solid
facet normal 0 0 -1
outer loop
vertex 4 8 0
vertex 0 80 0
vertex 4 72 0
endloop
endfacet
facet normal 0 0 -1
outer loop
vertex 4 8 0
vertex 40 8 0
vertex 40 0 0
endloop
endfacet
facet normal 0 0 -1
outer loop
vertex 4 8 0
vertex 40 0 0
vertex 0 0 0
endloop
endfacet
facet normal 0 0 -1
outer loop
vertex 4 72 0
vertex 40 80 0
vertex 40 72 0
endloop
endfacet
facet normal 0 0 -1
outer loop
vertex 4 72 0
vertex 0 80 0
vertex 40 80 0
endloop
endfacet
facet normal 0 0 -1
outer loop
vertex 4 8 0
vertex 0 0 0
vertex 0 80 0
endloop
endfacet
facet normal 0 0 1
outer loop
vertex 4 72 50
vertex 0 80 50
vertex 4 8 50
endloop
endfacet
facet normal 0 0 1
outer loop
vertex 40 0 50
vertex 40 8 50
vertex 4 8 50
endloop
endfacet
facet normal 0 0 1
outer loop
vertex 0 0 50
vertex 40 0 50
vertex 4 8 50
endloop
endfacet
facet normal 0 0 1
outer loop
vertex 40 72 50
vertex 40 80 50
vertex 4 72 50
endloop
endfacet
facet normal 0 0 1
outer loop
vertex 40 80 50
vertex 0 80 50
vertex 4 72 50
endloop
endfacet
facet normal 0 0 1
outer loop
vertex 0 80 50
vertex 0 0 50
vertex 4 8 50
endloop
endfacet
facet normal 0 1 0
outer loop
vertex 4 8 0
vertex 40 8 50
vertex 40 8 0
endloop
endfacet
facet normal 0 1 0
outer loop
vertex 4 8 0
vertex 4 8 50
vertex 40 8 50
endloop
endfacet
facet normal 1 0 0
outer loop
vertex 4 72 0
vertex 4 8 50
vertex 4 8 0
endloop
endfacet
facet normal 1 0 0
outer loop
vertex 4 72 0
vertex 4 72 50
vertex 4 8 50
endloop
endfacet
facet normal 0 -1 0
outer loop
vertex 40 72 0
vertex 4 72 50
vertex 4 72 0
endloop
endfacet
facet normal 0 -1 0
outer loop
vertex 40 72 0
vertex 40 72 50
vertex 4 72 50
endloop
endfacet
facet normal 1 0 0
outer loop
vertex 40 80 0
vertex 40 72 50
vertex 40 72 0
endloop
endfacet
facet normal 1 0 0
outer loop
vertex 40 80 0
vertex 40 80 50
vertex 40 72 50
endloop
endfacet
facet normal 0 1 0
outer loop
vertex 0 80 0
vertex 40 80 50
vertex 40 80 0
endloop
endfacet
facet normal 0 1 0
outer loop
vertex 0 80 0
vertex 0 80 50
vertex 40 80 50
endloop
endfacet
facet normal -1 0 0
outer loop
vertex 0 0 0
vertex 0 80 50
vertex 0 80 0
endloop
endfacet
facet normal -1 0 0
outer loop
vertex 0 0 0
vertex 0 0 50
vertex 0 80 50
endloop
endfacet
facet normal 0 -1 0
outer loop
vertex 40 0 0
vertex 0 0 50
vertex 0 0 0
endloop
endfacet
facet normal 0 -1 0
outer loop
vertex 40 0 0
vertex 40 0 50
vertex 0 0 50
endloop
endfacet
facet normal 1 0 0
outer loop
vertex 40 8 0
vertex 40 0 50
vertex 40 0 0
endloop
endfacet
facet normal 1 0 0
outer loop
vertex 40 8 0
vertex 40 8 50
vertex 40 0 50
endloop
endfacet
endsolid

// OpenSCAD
$fn = 32;

// ----------------------------------------------------------------------
// Structural section: channel 40 x 80 mm
// ----------------------------------------------------------------------

// --- parameters (mm) ---
sec_w = 40;               // channel width, X
sec_h = 80;               // channel height, Y
flange_t = 8;             // flange thickness
web_t = 4;                // web thickness
plate_t = 50;             // cut length, Z (extrusion height)

profile = [[0, 0], [40, 0], [40, 8], [4, 8], [4, 72], [40, 72], [40, 80], [0, 80]];  // primary outline, 8 points, counter clockwise

// --- the one profile operation ---
linear_extrude(height = plate_t) polygon(points = profile);
